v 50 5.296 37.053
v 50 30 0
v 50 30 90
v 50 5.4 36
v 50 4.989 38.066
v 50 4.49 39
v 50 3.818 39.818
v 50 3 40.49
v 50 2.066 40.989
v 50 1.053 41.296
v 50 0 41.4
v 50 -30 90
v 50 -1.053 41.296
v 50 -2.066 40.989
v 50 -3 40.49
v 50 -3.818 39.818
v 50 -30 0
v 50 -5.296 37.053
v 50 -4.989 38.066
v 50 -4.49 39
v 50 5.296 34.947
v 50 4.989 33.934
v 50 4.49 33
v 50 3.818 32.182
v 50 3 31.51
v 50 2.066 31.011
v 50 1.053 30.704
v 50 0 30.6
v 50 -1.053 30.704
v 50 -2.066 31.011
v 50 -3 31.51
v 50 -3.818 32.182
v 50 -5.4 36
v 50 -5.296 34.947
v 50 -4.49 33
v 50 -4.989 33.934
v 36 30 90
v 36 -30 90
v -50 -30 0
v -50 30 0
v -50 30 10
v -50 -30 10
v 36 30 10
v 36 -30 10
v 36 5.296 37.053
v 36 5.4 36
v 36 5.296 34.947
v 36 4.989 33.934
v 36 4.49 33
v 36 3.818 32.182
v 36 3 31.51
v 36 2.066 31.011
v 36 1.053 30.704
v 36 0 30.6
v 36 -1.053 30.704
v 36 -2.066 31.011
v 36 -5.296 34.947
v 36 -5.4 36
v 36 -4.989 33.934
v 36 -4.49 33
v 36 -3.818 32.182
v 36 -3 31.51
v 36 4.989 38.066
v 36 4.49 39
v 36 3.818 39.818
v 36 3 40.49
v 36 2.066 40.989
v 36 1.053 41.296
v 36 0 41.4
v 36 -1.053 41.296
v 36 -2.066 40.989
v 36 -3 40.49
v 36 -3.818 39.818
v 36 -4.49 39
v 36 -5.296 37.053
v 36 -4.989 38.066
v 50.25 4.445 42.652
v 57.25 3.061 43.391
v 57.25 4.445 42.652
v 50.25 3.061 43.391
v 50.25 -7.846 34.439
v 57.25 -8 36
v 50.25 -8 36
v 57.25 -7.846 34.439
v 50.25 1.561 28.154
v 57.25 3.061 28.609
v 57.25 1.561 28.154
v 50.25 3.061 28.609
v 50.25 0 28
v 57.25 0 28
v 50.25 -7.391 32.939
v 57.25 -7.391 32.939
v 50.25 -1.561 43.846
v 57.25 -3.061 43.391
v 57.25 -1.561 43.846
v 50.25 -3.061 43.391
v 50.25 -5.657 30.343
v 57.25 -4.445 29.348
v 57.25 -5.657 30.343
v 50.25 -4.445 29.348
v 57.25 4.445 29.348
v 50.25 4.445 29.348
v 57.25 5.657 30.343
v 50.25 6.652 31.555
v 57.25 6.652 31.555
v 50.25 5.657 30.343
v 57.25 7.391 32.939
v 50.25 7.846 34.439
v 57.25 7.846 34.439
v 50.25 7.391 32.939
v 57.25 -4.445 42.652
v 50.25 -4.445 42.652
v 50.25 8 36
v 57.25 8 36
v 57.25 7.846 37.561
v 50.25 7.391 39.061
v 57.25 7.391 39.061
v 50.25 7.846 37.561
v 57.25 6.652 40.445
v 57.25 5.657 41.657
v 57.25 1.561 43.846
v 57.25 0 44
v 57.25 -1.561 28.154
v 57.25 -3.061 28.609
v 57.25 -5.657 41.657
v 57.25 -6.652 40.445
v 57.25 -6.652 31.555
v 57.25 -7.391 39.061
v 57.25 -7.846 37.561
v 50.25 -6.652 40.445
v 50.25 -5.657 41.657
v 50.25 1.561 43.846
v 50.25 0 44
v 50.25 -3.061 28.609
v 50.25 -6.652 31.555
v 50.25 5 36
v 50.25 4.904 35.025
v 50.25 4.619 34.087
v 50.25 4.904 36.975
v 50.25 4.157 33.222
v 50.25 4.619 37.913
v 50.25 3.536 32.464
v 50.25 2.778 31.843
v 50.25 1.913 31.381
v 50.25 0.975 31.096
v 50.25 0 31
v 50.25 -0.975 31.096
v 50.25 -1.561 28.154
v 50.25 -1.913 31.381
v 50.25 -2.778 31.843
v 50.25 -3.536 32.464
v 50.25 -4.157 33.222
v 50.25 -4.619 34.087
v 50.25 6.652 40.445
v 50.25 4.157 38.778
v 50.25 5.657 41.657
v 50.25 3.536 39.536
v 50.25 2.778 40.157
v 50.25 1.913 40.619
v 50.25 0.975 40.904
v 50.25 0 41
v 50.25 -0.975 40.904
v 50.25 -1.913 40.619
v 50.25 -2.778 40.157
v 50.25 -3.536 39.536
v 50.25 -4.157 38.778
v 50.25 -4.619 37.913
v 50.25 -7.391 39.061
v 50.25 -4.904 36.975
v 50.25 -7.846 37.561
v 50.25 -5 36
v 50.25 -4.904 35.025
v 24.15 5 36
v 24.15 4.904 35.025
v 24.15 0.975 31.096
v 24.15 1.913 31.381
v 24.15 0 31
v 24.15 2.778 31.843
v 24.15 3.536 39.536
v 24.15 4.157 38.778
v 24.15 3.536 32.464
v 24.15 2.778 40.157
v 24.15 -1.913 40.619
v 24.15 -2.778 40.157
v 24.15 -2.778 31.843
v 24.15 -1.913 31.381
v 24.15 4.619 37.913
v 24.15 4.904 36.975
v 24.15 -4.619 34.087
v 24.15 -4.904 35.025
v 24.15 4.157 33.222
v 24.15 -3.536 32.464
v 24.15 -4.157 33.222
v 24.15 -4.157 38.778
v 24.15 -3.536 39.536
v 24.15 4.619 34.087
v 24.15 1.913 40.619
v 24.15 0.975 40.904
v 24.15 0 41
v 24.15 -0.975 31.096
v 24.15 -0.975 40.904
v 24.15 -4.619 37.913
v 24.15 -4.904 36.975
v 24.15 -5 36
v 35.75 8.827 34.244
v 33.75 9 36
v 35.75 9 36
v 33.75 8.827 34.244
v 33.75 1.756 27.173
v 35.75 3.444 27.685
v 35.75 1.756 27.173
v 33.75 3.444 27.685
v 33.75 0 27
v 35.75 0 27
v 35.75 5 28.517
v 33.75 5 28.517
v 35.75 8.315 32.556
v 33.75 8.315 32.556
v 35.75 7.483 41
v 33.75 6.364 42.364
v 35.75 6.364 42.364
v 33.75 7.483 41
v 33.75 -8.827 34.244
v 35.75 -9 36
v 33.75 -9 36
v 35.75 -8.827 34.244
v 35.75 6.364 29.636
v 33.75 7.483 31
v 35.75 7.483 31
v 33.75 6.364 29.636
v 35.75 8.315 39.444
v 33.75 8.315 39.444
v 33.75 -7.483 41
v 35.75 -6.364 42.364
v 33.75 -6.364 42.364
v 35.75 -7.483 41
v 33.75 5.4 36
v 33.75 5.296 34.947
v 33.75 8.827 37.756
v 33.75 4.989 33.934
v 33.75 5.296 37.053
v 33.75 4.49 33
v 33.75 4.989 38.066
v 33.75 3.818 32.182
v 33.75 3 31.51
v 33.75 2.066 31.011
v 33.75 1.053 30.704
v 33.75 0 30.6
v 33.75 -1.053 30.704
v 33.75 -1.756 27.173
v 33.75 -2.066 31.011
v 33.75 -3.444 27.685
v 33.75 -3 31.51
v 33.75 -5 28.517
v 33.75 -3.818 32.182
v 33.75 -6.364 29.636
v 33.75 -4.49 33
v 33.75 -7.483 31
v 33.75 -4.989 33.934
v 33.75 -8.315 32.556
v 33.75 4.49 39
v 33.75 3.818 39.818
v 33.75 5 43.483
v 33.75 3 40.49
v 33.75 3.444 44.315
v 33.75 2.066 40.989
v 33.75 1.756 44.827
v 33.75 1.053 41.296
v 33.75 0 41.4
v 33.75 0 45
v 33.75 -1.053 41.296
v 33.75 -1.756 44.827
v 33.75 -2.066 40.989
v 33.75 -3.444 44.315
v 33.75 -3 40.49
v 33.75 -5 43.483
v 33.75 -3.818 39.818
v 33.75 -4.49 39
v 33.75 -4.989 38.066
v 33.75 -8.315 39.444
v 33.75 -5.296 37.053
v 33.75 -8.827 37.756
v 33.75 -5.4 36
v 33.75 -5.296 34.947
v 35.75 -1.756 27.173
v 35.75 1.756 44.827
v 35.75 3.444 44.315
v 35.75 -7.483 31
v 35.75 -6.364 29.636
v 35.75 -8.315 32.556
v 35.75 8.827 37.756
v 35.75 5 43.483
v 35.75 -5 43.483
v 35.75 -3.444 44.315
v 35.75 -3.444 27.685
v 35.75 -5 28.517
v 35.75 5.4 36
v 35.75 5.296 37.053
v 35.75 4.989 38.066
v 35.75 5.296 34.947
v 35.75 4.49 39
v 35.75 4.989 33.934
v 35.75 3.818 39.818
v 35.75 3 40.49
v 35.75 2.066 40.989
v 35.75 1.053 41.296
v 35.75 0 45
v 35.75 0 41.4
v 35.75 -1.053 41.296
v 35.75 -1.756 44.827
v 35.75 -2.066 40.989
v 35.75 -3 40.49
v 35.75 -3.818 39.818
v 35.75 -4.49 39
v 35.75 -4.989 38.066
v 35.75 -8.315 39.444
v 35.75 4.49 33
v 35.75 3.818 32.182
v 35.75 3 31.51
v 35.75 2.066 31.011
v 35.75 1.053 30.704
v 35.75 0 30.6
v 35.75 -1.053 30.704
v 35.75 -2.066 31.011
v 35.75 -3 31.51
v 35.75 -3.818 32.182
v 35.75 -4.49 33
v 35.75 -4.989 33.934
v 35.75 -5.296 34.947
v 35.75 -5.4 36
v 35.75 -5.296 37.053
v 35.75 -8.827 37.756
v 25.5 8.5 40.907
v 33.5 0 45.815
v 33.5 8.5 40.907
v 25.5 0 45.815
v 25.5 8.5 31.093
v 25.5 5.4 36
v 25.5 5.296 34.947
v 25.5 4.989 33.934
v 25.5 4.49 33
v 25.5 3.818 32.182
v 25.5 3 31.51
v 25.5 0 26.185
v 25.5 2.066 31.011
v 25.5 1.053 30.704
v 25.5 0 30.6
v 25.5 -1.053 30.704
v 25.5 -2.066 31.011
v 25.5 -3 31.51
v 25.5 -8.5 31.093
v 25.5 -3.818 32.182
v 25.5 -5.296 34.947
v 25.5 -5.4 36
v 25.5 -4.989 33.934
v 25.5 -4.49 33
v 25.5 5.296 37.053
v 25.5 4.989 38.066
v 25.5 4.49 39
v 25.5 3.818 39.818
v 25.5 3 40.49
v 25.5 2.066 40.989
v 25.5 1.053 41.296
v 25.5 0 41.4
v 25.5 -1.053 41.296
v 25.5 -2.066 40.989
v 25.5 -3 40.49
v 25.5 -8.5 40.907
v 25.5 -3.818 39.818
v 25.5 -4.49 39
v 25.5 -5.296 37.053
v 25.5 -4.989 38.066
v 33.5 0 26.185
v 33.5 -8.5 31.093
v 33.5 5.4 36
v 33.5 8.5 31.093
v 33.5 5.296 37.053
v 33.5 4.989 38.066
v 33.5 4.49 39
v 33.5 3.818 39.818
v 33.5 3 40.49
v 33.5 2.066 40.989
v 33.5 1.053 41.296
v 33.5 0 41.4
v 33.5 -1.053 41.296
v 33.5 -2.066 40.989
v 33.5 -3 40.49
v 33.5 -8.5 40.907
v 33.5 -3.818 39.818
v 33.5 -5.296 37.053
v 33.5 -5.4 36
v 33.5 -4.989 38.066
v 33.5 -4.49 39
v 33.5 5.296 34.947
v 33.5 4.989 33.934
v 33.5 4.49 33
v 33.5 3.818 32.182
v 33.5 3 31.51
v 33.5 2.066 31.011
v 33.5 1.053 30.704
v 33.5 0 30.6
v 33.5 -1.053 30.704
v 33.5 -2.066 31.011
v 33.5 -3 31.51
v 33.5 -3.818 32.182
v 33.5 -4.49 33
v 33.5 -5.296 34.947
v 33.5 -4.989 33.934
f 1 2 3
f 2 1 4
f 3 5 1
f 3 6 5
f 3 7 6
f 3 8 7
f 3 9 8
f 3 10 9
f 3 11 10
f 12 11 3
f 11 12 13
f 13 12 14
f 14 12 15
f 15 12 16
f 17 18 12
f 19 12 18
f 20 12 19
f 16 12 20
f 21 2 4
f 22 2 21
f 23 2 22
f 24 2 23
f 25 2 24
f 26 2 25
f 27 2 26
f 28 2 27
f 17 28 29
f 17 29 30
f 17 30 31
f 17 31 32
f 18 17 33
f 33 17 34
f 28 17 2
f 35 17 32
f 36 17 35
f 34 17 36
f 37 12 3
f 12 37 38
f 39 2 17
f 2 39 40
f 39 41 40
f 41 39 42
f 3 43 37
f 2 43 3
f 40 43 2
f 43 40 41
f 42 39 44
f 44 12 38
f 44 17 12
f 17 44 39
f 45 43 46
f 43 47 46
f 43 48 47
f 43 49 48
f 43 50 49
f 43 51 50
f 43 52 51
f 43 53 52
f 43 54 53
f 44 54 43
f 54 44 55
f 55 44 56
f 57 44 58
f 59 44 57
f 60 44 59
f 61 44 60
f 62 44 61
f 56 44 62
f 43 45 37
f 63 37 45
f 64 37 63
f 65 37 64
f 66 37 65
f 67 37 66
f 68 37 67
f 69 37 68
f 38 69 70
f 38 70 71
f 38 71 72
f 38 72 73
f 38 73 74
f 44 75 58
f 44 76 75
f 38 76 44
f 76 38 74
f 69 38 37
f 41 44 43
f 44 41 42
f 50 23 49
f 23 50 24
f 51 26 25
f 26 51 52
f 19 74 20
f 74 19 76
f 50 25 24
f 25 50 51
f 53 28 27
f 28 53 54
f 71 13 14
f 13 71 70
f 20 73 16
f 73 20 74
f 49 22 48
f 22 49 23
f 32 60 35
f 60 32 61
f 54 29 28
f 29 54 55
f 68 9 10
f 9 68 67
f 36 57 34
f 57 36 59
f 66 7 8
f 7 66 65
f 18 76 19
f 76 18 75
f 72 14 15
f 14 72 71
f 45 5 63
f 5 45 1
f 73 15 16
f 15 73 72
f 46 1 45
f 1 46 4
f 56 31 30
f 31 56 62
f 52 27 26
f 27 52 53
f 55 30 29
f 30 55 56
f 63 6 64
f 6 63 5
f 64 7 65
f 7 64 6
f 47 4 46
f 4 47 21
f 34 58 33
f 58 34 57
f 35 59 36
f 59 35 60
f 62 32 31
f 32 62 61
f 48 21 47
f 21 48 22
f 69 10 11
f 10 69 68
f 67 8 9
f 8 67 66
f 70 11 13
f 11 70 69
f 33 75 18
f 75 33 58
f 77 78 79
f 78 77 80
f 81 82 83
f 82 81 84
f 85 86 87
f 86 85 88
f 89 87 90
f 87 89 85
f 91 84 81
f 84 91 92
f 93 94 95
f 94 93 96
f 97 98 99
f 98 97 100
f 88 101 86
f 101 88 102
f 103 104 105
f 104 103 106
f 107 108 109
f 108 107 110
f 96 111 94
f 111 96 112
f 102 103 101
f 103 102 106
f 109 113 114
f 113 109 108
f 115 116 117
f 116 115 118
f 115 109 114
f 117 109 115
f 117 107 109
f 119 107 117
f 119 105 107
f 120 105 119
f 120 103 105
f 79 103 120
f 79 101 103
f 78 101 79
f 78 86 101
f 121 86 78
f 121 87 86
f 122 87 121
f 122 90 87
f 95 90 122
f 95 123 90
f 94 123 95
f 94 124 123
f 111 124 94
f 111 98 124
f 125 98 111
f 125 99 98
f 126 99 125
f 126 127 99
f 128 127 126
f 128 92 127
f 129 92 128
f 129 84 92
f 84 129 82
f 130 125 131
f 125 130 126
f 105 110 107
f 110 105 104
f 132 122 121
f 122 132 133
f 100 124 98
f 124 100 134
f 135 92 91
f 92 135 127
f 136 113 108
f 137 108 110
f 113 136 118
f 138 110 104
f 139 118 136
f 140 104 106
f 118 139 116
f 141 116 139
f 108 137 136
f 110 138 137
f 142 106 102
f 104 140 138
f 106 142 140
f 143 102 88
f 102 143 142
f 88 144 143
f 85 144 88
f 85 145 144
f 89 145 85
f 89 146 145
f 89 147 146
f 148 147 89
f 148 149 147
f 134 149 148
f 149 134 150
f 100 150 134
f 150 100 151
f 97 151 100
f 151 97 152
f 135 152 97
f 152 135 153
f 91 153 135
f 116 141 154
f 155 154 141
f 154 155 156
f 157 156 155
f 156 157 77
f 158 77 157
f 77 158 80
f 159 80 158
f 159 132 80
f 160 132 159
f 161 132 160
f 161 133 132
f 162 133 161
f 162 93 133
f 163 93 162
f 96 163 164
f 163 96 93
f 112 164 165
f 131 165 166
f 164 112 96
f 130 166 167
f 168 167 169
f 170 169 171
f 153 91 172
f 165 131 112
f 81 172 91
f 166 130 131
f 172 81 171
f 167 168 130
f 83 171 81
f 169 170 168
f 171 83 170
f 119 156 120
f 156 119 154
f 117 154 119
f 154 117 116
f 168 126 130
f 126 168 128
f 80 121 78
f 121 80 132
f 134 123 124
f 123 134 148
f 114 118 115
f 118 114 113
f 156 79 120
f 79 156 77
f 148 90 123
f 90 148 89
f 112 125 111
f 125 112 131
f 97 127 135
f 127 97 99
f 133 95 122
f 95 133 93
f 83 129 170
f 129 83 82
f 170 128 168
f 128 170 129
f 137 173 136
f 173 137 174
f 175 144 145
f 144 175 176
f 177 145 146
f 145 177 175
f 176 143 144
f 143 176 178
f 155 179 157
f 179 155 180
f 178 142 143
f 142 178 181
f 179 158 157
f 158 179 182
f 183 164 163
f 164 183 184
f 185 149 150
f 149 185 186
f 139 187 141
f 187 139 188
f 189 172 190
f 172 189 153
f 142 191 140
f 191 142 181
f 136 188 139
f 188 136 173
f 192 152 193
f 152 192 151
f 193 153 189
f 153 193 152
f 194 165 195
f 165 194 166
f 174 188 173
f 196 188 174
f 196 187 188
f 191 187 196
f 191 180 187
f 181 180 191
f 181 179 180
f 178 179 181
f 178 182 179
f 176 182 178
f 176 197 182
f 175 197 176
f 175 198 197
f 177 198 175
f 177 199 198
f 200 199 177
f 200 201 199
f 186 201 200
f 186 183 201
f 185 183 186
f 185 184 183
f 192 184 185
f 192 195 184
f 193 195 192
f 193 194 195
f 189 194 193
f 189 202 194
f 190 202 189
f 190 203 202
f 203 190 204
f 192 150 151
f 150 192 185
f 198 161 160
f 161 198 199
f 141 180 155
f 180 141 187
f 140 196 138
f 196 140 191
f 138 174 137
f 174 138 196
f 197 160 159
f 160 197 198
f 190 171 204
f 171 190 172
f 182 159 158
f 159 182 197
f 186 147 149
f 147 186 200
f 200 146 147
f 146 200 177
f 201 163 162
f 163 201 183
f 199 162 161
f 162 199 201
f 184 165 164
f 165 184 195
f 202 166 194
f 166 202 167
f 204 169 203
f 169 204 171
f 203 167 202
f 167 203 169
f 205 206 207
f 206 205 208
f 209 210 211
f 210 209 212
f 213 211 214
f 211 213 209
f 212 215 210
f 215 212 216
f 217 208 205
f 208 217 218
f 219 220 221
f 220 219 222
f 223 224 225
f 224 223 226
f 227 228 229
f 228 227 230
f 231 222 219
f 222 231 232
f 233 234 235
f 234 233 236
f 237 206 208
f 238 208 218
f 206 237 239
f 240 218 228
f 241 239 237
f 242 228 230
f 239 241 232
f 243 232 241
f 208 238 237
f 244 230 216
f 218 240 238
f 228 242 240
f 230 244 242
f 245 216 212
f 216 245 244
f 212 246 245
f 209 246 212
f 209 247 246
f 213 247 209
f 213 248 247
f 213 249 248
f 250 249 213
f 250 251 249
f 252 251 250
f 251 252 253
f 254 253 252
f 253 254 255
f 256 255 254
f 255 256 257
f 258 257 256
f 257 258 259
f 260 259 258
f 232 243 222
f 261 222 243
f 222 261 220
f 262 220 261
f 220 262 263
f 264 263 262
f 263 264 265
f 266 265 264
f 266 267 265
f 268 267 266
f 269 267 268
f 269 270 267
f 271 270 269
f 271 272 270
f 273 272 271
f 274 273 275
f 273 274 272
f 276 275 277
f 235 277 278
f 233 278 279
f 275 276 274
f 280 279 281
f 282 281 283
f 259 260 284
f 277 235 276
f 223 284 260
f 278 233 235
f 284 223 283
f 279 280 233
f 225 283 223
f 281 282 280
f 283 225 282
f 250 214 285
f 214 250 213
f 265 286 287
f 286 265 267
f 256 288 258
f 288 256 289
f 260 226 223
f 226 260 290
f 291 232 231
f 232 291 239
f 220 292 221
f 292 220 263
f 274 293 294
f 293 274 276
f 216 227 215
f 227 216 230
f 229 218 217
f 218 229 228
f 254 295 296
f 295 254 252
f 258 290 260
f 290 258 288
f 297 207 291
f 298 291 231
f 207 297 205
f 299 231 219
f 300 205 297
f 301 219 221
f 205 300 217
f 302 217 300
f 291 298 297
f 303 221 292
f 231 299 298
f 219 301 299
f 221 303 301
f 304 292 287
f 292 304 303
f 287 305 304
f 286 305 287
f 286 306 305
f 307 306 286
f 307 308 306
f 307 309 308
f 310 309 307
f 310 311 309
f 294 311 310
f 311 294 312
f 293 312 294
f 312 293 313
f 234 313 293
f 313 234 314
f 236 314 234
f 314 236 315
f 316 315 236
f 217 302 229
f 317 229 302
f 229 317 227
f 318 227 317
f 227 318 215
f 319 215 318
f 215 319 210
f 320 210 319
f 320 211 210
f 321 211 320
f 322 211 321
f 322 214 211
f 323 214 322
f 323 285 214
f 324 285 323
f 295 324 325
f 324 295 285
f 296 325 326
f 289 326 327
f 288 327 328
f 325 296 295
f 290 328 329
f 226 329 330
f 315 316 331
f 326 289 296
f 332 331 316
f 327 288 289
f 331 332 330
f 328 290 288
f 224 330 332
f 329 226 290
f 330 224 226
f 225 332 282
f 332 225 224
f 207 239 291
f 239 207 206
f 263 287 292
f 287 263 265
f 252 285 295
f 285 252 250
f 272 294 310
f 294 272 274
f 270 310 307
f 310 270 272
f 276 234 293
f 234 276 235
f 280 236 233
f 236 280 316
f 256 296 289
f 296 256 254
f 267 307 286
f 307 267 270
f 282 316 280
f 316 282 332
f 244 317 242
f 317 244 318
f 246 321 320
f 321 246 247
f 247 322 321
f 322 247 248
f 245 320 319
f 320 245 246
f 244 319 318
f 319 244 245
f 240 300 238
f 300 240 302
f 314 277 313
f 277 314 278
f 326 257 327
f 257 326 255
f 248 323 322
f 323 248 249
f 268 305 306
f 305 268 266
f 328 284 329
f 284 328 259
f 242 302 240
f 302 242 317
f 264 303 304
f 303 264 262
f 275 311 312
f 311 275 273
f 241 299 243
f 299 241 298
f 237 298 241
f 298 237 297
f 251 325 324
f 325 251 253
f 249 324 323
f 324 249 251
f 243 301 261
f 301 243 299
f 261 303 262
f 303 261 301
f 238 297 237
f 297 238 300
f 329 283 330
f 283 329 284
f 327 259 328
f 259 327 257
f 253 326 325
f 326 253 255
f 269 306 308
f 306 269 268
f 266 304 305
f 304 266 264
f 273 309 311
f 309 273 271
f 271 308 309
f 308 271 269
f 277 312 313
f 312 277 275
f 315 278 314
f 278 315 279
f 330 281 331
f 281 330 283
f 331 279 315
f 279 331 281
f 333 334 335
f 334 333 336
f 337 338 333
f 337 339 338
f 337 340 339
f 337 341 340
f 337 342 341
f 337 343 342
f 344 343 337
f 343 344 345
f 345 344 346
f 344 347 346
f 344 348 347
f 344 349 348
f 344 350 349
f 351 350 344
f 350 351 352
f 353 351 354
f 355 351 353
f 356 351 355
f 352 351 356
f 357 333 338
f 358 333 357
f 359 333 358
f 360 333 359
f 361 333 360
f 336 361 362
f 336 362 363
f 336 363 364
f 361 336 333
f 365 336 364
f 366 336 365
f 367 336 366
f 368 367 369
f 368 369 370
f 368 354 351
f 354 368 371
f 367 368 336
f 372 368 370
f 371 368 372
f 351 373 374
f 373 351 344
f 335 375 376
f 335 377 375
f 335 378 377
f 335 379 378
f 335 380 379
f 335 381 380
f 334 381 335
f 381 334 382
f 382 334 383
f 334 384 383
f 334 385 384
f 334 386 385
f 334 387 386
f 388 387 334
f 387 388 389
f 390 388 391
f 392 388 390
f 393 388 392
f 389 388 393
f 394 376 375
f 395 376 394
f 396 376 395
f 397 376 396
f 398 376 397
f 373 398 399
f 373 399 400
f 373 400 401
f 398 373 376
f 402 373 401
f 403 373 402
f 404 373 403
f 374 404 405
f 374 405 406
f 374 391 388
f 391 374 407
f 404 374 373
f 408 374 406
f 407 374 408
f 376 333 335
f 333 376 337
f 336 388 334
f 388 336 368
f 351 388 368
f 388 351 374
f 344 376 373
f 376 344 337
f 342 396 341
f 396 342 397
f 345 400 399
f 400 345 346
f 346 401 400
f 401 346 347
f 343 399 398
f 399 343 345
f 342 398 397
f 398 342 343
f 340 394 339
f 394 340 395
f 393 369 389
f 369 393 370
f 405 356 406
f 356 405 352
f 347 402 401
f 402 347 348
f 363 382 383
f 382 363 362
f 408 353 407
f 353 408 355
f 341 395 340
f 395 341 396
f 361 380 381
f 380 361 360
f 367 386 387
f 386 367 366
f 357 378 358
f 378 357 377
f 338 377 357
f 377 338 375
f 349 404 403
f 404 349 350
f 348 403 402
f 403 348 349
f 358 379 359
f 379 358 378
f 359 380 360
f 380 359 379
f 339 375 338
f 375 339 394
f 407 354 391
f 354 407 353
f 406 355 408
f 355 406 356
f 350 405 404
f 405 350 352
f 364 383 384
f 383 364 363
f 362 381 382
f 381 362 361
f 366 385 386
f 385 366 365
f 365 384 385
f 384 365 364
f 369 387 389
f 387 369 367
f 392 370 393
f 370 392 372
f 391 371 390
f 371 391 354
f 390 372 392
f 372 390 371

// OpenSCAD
$fn = 32;

// ------------------------------------------------------------------------
// Bolted bracket: 100 x 60 mm bracket with 1 bolt joints
// Every part is its own module, assembly() places them once.
// ------------------------------------------------------------------------

// --- part 1 ---
module bracket() {
  difference() {
    translate([-50, -30, 0]) cube([100, 60, 90]);
    translate([-51, -31, 10]) cube([87, 62, 81]);
    translate([43, 0, 36]) rotate([0, 90, 0]) cylinder(h = 16, d = 10.8, center = true);
  }
}

// --- part 2 ---
module bolt() {
  cylinder(h = 7, d = 16);
  translate([0, 0, -26.1]) cylinder(h = 26.1, d = 10);
}

// --- part 3 ---
module washer() {
  difference() {
      translate([0, 0, 0]) cylinder(h = 2, d = 18);
      translate([0, 0, -1]) cylinder(h = 4, d = 10.8);
    }
}

// --- part 4 ---
module nut() {
  difference() {
    linear_extrude(height = 8) polygon(points = [[9.815, 0], [4.907, 8.5], [-4.907, 8.5], [-9.815, 0], [-4.907, -8.5], [4.907, -8.5]]);
    translate([0, 0, -1]) cylinder(h = 10, d = 10.8);
  }
}

// --- assembly ---
module assembly() {
  translate([0, 0, 0]) rotate([0, 0, 0]) bracket();
  translate([50.25, 0, 36]) rotate([0, 90, 0]) bolt();
  translate([33.75, 0, 36]) rotate([0, 90, 0]) washer();
  translate([25.5, 0, 36]) rotate([0, 90, 0]) nut();
}

assembly();
